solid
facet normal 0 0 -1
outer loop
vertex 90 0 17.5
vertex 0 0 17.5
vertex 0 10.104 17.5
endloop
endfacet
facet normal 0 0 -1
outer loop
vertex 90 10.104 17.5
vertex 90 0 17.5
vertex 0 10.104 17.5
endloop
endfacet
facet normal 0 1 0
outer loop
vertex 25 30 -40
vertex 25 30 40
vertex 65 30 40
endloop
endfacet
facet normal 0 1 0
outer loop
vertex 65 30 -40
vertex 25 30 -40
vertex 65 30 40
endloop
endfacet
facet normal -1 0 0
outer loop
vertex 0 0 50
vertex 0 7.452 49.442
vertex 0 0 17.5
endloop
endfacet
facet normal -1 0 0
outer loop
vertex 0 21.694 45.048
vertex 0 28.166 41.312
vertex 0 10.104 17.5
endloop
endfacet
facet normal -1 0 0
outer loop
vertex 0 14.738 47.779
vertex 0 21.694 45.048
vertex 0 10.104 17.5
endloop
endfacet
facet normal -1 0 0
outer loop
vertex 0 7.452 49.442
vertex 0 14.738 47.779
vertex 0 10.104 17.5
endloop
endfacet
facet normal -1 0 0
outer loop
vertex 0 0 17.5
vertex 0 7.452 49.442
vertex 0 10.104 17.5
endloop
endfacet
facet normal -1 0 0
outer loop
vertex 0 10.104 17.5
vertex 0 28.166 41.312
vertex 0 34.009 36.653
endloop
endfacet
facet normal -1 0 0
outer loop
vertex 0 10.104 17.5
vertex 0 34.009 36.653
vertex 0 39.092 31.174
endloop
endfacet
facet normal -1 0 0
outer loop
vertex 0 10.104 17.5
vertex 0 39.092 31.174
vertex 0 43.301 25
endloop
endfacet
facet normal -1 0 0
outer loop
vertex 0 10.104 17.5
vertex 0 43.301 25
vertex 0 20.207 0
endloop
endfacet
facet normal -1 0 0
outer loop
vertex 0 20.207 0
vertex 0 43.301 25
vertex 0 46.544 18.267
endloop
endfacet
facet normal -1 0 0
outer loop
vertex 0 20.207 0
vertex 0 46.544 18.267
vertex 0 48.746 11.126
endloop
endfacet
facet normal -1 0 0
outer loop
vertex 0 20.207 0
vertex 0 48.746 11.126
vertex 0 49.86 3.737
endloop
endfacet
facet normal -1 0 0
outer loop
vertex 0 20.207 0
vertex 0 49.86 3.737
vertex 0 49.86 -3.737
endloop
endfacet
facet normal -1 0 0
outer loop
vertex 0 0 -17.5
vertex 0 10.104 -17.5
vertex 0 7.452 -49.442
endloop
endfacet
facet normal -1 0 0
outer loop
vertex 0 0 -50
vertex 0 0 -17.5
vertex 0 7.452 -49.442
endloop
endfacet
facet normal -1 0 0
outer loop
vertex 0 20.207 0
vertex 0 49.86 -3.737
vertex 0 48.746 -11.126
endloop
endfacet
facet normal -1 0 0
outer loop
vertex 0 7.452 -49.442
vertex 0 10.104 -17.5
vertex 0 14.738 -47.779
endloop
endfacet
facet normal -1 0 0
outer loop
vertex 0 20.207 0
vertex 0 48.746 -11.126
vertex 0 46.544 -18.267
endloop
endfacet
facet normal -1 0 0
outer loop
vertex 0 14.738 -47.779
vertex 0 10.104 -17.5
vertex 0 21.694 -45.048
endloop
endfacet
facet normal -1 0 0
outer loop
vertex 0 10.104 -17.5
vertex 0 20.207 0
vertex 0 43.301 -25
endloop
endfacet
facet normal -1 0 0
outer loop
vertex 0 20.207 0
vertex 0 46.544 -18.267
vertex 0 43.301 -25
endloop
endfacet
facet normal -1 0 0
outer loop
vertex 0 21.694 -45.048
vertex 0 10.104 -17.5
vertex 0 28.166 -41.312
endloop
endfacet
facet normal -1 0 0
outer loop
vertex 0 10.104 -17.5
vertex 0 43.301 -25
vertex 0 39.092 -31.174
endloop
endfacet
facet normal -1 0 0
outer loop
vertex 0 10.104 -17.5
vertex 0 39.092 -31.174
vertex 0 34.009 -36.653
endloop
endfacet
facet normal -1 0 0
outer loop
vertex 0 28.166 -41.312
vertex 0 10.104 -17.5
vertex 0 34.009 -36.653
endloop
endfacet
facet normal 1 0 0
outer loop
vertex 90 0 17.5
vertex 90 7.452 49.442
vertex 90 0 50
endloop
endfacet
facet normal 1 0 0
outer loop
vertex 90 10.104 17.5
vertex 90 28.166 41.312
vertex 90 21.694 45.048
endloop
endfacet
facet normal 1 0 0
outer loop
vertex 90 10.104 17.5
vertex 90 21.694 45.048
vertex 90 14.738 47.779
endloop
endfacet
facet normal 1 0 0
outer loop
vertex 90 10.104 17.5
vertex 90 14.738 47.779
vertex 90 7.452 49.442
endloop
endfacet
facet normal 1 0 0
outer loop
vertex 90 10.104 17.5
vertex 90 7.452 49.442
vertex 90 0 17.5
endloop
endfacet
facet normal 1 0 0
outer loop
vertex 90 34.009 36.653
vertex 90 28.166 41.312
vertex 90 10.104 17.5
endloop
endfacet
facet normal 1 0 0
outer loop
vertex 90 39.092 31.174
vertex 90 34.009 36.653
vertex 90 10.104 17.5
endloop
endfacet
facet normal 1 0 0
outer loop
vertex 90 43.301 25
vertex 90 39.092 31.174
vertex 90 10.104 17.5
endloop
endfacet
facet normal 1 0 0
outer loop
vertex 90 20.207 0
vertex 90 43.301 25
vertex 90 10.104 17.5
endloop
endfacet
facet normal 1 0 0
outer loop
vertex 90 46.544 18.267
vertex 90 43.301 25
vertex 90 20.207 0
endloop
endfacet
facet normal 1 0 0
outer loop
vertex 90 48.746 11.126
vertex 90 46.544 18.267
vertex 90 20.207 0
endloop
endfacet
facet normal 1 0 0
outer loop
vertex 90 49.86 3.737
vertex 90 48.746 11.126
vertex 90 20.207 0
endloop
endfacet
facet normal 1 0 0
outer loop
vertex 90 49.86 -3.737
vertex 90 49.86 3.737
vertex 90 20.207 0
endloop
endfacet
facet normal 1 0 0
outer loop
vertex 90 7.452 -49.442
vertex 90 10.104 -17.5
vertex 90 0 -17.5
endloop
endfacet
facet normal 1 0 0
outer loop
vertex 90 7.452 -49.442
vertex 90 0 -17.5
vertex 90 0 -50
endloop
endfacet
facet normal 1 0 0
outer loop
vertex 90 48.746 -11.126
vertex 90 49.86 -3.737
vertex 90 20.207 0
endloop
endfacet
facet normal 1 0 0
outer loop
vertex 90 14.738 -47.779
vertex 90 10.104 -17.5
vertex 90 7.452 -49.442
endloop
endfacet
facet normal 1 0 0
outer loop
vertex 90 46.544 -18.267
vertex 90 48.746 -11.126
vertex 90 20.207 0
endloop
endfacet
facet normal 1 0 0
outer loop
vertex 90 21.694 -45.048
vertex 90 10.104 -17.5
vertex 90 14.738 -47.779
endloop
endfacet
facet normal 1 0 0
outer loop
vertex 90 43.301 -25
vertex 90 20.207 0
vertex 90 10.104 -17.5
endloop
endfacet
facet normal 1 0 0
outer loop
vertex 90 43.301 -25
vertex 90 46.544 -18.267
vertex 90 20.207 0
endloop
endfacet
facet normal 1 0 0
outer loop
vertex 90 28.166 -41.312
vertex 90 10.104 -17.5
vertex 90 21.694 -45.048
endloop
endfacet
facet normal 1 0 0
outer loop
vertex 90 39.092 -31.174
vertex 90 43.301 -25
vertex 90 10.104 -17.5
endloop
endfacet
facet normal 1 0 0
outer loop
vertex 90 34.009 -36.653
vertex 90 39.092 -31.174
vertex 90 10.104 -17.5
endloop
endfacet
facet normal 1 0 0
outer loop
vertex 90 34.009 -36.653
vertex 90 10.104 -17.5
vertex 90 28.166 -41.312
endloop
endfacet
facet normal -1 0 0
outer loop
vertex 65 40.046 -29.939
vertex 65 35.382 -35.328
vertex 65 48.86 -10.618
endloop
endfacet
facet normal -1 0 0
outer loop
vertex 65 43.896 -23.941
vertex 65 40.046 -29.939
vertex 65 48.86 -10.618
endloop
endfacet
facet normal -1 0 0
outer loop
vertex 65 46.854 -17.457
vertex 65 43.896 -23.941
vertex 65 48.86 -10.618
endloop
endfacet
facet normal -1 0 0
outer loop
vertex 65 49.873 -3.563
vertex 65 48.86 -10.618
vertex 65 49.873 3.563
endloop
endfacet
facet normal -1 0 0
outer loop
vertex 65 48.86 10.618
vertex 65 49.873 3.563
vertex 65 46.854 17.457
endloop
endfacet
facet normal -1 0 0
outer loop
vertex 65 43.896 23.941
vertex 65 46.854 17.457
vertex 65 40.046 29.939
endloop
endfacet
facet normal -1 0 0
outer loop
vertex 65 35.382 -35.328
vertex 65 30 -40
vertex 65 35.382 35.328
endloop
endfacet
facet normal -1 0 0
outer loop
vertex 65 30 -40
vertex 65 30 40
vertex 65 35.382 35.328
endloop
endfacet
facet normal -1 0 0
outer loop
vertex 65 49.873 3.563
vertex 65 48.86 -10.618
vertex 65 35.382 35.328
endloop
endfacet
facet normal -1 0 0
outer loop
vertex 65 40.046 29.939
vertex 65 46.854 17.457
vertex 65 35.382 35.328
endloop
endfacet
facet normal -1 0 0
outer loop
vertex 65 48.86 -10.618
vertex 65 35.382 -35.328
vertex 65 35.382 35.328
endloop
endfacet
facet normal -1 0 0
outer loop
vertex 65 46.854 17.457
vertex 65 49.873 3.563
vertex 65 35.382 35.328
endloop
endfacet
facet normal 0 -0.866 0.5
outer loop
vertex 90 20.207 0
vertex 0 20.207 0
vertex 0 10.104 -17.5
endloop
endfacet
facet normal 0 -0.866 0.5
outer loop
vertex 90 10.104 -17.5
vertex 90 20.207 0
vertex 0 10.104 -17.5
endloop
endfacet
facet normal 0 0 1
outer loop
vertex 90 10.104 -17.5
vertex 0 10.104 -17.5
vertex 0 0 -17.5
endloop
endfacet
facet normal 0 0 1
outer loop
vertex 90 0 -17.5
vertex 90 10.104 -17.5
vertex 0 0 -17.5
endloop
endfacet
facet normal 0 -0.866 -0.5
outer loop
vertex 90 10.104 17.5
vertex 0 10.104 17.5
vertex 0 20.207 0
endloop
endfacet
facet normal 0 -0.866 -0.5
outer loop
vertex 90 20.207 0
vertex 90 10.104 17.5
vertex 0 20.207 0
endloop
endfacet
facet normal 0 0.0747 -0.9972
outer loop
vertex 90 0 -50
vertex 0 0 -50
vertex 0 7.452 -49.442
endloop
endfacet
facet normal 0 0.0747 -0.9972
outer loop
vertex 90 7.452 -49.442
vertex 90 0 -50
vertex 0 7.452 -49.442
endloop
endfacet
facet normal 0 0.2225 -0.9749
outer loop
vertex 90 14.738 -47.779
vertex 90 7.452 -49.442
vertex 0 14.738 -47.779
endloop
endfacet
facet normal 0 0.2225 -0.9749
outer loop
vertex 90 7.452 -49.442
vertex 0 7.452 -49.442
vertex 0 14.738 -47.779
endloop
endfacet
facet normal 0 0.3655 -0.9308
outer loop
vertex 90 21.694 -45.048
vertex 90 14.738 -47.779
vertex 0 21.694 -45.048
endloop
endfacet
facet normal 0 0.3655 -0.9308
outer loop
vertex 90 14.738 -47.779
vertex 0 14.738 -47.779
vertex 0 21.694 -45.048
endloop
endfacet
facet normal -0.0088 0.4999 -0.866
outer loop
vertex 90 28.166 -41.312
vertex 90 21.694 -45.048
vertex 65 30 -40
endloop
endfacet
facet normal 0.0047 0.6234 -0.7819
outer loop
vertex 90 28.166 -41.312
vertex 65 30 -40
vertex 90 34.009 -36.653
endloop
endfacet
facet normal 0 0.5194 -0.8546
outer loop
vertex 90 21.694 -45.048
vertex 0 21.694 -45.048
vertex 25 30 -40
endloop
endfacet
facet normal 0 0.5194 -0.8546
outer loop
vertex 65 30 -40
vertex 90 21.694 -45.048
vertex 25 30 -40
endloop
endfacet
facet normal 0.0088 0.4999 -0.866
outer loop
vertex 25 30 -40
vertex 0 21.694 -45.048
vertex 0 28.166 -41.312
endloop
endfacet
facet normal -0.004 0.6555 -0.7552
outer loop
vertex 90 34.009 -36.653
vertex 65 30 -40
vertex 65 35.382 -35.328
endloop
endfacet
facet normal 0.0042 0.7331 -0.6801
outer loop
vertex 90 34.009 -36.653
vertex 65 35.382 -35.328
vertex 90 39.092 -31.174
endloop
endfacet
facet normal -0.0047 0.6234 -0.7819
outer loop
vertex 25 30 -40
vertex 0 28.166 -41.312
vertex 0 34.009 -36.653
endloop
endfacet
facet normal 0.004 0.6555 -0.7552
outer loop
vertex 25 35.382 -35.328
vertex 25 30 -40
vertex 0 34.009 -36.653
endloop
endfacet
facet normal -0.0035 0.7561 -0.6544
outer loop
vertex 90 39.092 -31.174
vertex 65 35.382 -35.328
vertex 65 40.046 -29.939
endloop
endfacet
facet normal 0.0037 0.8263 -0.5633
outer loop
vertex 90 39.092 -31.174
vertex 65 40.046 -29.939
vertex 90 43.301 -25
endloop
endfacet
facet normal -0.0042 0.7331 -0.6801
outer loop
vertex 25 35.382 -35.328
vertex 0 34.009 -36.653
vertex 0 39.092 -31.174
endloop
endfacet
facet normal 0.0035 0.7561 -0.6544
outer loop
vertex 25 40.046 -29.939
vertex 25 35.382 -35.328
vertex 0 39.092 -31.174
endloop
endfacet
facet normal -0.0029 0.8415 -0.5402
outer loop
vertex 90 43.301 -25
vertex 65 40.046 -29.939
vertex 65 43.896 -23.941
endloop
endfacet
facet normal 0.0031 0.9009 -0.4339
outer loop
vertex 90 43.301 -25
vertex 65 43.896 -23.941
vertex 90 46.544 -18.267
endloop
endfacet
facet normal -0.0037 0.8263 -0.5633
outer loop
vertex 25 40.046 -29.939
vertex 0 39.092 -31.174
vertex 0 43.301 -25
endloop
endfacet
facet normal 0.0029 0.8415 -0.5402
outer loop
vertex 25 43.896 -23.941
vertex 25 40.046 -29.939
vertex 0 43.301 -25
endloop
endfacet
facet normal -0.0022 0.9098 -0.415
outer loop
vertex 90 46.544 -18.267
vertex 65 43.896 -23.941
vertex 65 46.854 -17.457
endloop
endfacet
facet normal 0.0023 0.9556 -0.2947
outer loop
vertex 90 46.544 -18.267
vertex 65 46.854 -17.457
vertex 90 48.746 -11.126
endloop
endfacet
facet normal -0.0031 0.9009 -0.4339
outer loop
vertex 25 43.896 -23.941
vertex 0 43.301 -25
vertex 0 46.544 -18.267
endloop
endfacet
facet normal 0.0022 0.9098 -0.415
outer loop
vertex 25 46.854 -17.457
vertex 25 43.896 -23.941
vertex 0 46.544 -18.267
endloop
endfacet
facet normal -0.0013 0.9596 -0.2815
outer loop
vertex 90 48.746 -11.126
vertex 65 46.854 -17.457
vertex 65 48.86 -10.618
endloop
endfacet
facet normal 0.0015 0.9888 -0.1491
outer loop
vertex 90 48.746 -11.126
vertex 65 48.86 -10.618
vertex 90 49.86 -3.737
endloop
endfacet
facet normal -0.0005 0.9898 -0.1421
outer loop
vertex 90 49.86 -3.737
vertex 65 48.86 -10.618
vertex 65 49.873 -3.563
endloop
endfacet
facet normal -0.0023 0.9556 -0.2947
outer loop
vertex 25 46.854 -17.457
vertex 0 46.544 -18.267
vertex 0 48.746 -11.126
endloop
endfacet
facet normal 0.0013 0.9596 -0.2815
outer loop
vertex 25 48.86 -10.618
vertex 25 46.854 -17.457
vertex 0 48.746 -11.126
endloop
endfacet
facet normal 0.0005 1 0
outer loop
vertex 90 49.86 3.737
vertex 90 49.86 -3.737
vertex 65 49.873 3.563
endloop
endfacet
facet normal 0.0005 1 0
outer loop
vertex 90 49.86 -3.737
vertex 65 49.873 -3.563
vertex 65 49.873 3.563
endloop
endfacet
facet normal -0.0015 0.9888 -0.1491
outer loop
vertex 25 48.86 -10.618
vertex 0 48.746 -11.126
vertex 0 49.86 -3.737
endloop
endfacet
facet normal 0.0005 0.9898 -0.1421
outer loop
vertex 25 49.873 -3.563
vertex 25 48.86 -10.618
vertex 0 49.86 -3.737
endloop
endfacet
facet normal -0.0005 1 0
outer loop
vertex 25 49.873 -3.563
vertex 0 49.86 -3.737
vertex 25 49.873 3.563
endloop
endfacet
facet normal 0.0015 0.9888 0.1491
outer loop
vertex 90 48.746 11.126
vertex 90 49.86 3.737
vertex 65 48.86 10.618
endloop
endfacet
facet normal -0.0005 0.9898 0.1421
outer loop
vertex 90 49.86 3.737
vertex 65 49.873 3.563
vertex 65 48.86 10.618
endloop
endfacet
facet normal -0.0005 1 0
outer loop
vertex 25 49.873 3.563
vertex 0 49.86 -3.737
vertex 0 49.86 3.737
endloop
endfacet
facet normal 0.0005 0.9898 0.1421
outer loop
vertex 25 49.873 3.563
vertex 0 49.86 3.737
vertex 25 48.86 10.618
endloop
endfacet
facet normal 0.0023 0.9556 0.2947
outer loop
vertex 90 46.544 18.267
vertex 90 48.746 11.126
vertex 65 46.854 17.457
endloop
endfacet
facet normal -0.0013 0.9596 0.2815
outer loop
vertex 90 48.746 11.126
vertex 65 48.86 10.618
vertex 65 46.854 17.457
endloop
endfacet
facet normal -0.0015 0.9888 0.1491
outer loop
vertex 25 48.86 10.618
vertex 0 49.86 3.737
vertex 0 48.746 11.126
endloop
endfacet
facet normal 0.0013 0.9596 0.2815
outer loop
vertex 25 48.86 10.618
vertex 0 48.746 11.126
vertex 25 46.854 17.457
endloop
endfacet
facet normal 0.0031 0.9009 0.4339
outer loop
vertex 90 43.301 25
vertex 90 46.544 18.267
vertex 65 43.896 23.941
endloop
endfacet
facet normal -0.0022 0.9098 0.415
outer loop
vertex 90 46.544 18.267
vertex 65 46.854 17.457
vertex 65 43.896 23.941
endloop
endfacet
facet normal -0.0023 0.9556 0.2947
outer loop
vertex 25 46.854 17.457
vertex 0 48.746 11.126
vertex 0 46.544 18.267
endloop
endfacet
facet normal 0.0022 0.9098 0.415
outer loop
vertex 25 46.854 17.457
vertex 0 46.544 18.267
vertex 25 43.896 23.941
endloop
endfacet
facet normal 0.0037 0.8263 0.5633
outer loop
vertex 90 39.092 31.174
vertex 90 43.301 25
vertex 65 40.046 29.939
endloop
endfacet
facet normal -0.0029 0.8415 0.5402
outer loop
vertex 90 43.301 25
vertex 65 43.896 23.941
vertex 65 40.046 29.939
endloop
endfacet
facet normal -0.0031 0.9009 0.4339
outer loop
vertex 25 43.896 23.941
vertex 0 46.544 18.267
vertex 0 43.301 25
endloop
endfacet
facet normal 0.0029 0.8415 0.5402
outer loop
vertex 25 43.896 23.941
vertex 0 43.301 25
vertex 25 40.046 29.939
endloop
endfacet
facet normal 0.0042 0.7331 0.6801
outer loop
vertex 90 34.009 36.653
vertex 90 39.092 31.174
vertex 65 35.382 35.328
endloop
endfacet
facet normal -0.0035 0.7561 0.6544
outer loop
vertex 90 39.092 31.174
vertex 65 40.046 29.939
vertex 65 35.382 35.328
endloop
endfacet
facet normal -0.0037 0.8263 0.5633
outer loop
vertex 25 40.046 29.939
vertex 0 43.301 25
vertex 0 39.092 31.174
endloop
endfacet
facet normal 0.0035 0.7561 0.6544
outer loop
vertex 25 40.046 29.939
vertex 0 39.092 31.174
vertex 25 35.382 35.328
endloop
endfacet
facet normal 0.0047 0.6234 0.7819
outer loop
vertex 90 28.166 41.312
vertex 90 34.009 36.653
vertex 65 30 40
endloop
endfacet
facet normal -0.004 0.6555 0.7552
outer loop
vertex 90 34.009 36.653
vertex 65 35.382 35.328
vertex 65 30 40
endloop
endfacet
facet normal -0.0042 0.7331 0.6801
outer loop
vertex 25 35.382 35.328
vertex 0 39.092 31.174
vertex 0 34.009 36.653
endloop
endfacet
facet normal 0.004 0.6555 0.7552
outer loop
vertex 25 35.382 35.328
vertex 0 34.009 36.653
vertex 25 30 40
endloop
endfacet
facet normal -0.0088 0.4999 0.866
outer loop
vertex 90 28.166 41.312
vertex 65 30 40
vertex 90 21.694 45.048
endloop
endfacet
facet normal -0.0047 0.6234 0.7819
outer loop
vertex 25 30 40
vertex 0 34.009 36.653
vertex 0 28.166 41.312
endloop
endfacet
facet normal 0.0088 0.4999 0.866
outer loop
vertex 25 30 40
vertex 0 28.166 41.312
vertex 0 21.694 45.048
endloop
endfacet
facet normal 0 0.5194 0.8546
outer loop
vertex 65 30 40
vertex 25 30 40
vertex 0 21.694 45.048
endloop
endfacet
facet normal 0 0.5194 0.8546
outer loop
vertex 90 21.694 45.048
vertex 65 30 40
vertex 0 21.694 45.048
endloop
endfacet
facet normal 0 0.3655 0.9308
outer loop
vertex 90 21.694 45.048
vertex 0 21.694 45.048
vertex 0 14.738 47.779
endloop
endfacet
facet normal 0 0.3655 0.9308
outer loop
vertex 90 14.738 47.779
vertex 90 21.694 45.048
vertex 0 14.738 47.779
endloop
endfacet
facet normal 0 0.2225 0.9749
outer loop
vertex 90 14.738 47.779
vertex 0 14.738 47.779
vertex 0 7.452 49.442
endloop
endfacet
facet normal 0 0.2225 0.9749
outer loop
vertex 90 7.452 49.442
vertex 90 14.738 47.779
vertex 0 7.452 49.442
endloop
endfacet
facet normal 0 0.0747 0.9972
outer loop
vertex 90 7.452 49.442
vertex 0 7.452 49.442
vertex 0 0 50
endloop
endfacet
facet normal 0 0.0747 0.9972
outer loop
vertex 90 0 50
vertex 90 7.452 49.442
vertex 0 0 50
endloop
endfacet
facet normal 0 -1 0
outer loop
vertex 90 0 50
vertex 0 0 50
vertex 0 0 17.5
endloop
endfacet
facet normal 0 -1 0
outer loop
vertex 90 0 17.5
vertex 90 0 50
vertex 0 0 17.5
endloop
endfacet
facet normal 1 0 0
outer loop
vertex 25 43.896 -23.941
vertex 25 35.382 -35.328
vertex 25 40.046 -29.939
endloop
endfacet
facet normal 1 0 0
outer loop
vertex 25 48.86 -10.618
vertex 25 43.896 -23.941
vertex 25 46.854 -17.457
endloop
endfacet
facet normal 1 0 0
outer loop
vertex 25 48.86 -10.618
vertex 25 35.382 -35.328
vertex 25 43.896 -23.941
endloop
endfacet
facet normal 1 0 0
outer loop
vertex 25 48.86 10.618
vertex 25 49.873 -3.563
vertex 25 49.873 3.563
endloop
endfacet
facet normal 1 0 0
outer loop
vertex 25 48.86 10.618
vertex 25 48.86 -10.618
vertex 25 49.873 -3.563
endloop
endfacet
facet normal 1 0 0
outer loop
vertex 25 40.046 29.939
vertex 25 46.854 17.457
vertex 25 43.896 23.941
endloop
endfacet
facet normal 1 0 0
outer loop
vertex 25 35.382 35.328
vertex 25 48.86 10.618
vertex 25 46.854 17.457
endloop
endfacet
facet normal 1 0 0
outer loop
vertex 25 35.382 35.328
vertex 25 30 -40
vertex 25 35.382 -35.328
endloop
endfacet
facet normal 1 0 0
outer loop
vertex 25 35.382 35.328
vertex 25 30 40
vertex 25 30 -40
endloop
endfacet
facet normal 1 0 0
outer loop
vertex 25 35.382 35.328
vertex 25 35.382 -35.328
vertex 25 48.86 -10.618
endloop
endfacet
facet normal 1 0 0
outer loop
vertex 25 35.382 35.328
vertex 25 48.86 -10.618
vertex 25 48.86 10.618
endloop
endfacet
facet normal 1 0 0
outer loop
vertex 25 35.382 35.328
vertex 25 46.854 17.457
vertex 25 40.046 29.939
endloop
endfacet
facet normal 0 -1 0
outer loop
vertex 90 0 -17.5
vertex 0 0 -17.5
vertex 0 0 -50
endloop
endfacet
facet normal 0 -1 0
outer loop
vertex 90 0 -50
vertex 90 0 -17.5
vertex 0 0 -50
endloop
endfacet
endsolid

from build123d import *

# Parameters (mm, degrees)
BOSS_EXTRUDE1_DEPTH                 = 90
CUT_EXTRUDE1_REACH                  = 116.455
CUT_EXTRUDE2_REACH                  = 116.455
CUT_EXTRUDE2_END_RADIUS             = 50
SKETCH3_W                           = 40
SKETCH3_H                           = 20
CUT_EXTRUDE2_DIRECTION_2_REACH      = 116.455
CUT_EXTRUDE2_DIRECTION_2_END_RADIUS = 50


with BuildPart() as part:
    # Sketch1 → Boss-Extrude1 (new body)
    with BuildSketch(Plane(origin=(0, 0, 0), x_dir=(0, 0, -1), z_dir=(1, 0, 0))):
        with BuildLine():
            Line((-50, 0), (50, 0))
            ThreePointArc((50, 0), (0, 50), (-50, 0))
        make_face()
    extrude(amount=BOSS_EXTRUDE1_DEPTH)

    # Sketch2 → Cut-Extrude1 (cut, up to next)
    with BuildSketch(Plane.ZY, mode=Mode.PRIVATE) as cut_extrude1_sk1:
        Polygon((0, 20.207259422), (-17.5, 10.103629711), (-17.5, -10.103629711), (0, -20.207259422), (17.5, -10.103629711), (17.5, 10.103629711), align=None)
    cut_extrude1_tool1 = extrude(cut_extrude1_sk1.sketch, amount=-CUT_EXTRUDE1_REACH, mode=Mode.PRIVATE) & part.part
    add(cut_extrude1_tool1.solids().sort_by_distance((0, 0, 0))[0], mode=Mode.SUBTRACT)

    # Cut-Extrude2: up to this cylinder (the profile starts inside it)
    cut_extrude2_end = Plane(origin=(45, 0, 0), z_dir=(-1, 0, 0)) * Cylinder(CUT_EXTRUDE2_END_RADIUS, 333.91, mode=Mode.PRIVATE)
    # Sketch3 → Cut-Extrude2 (cut, up to the surface)
    with BuildSketch(Plane.XY, mode=Mode.PRIVATE) as cut_extrude2_sk1:
        with Locations((45, 40)):
            Rectangle(SKETCH3_W, SKETCH3_H)
    cut_extrude2_tool1 = extrude(cut_extrude2_sk1.sketch, amount=-CUT_EXTRUDE2_REACH, mode=Mode.PRIVATE) & cut_extrude2_end
    add(cut_extrude2_tool1.solids().sort_by_distance((45, 40, 0))[0], mode=Mode.SUBTRACT)

    # Cut-Extrude2 direction 2: up to this cylinder (the profile starts inside it)
    cut_extrude2_direction_2_end = Plane(origin=(45, 0, 0), z_dir=(-1, 0, 0)) * Cylinder(CUT_EXTRUDE2_DIRECTION_2_END_RADIUS, 333.91, mode=Mode.PRIVATE)
    # Sketch3 → Cut-Extrude2 direction 2 (cut, up to the surface)
    with BuildSketch(Plane.XY, mode=Mode.PRIVATE) as cut_extrude2_direction_2_sk1:
        with Locations((45, 40)):
            Rectangle(SKETCH3_W, SKETCH3_H)
    cut_extrude2_direction_2_tool1 = extrude(cut_extrude2_direction_2_sk1.sketch, amount=CUT_EXTRUDE2_DIRECTION_2_REACH, mode=Mode.PRIVATE) & cut_extrude2_direction_2_end
    add(cut_extrude2_direction_2_tool1.solids().sort_by_distance((45, 40, 0))[0], mode=Mode.SUBTRACT)


solid = part.part
